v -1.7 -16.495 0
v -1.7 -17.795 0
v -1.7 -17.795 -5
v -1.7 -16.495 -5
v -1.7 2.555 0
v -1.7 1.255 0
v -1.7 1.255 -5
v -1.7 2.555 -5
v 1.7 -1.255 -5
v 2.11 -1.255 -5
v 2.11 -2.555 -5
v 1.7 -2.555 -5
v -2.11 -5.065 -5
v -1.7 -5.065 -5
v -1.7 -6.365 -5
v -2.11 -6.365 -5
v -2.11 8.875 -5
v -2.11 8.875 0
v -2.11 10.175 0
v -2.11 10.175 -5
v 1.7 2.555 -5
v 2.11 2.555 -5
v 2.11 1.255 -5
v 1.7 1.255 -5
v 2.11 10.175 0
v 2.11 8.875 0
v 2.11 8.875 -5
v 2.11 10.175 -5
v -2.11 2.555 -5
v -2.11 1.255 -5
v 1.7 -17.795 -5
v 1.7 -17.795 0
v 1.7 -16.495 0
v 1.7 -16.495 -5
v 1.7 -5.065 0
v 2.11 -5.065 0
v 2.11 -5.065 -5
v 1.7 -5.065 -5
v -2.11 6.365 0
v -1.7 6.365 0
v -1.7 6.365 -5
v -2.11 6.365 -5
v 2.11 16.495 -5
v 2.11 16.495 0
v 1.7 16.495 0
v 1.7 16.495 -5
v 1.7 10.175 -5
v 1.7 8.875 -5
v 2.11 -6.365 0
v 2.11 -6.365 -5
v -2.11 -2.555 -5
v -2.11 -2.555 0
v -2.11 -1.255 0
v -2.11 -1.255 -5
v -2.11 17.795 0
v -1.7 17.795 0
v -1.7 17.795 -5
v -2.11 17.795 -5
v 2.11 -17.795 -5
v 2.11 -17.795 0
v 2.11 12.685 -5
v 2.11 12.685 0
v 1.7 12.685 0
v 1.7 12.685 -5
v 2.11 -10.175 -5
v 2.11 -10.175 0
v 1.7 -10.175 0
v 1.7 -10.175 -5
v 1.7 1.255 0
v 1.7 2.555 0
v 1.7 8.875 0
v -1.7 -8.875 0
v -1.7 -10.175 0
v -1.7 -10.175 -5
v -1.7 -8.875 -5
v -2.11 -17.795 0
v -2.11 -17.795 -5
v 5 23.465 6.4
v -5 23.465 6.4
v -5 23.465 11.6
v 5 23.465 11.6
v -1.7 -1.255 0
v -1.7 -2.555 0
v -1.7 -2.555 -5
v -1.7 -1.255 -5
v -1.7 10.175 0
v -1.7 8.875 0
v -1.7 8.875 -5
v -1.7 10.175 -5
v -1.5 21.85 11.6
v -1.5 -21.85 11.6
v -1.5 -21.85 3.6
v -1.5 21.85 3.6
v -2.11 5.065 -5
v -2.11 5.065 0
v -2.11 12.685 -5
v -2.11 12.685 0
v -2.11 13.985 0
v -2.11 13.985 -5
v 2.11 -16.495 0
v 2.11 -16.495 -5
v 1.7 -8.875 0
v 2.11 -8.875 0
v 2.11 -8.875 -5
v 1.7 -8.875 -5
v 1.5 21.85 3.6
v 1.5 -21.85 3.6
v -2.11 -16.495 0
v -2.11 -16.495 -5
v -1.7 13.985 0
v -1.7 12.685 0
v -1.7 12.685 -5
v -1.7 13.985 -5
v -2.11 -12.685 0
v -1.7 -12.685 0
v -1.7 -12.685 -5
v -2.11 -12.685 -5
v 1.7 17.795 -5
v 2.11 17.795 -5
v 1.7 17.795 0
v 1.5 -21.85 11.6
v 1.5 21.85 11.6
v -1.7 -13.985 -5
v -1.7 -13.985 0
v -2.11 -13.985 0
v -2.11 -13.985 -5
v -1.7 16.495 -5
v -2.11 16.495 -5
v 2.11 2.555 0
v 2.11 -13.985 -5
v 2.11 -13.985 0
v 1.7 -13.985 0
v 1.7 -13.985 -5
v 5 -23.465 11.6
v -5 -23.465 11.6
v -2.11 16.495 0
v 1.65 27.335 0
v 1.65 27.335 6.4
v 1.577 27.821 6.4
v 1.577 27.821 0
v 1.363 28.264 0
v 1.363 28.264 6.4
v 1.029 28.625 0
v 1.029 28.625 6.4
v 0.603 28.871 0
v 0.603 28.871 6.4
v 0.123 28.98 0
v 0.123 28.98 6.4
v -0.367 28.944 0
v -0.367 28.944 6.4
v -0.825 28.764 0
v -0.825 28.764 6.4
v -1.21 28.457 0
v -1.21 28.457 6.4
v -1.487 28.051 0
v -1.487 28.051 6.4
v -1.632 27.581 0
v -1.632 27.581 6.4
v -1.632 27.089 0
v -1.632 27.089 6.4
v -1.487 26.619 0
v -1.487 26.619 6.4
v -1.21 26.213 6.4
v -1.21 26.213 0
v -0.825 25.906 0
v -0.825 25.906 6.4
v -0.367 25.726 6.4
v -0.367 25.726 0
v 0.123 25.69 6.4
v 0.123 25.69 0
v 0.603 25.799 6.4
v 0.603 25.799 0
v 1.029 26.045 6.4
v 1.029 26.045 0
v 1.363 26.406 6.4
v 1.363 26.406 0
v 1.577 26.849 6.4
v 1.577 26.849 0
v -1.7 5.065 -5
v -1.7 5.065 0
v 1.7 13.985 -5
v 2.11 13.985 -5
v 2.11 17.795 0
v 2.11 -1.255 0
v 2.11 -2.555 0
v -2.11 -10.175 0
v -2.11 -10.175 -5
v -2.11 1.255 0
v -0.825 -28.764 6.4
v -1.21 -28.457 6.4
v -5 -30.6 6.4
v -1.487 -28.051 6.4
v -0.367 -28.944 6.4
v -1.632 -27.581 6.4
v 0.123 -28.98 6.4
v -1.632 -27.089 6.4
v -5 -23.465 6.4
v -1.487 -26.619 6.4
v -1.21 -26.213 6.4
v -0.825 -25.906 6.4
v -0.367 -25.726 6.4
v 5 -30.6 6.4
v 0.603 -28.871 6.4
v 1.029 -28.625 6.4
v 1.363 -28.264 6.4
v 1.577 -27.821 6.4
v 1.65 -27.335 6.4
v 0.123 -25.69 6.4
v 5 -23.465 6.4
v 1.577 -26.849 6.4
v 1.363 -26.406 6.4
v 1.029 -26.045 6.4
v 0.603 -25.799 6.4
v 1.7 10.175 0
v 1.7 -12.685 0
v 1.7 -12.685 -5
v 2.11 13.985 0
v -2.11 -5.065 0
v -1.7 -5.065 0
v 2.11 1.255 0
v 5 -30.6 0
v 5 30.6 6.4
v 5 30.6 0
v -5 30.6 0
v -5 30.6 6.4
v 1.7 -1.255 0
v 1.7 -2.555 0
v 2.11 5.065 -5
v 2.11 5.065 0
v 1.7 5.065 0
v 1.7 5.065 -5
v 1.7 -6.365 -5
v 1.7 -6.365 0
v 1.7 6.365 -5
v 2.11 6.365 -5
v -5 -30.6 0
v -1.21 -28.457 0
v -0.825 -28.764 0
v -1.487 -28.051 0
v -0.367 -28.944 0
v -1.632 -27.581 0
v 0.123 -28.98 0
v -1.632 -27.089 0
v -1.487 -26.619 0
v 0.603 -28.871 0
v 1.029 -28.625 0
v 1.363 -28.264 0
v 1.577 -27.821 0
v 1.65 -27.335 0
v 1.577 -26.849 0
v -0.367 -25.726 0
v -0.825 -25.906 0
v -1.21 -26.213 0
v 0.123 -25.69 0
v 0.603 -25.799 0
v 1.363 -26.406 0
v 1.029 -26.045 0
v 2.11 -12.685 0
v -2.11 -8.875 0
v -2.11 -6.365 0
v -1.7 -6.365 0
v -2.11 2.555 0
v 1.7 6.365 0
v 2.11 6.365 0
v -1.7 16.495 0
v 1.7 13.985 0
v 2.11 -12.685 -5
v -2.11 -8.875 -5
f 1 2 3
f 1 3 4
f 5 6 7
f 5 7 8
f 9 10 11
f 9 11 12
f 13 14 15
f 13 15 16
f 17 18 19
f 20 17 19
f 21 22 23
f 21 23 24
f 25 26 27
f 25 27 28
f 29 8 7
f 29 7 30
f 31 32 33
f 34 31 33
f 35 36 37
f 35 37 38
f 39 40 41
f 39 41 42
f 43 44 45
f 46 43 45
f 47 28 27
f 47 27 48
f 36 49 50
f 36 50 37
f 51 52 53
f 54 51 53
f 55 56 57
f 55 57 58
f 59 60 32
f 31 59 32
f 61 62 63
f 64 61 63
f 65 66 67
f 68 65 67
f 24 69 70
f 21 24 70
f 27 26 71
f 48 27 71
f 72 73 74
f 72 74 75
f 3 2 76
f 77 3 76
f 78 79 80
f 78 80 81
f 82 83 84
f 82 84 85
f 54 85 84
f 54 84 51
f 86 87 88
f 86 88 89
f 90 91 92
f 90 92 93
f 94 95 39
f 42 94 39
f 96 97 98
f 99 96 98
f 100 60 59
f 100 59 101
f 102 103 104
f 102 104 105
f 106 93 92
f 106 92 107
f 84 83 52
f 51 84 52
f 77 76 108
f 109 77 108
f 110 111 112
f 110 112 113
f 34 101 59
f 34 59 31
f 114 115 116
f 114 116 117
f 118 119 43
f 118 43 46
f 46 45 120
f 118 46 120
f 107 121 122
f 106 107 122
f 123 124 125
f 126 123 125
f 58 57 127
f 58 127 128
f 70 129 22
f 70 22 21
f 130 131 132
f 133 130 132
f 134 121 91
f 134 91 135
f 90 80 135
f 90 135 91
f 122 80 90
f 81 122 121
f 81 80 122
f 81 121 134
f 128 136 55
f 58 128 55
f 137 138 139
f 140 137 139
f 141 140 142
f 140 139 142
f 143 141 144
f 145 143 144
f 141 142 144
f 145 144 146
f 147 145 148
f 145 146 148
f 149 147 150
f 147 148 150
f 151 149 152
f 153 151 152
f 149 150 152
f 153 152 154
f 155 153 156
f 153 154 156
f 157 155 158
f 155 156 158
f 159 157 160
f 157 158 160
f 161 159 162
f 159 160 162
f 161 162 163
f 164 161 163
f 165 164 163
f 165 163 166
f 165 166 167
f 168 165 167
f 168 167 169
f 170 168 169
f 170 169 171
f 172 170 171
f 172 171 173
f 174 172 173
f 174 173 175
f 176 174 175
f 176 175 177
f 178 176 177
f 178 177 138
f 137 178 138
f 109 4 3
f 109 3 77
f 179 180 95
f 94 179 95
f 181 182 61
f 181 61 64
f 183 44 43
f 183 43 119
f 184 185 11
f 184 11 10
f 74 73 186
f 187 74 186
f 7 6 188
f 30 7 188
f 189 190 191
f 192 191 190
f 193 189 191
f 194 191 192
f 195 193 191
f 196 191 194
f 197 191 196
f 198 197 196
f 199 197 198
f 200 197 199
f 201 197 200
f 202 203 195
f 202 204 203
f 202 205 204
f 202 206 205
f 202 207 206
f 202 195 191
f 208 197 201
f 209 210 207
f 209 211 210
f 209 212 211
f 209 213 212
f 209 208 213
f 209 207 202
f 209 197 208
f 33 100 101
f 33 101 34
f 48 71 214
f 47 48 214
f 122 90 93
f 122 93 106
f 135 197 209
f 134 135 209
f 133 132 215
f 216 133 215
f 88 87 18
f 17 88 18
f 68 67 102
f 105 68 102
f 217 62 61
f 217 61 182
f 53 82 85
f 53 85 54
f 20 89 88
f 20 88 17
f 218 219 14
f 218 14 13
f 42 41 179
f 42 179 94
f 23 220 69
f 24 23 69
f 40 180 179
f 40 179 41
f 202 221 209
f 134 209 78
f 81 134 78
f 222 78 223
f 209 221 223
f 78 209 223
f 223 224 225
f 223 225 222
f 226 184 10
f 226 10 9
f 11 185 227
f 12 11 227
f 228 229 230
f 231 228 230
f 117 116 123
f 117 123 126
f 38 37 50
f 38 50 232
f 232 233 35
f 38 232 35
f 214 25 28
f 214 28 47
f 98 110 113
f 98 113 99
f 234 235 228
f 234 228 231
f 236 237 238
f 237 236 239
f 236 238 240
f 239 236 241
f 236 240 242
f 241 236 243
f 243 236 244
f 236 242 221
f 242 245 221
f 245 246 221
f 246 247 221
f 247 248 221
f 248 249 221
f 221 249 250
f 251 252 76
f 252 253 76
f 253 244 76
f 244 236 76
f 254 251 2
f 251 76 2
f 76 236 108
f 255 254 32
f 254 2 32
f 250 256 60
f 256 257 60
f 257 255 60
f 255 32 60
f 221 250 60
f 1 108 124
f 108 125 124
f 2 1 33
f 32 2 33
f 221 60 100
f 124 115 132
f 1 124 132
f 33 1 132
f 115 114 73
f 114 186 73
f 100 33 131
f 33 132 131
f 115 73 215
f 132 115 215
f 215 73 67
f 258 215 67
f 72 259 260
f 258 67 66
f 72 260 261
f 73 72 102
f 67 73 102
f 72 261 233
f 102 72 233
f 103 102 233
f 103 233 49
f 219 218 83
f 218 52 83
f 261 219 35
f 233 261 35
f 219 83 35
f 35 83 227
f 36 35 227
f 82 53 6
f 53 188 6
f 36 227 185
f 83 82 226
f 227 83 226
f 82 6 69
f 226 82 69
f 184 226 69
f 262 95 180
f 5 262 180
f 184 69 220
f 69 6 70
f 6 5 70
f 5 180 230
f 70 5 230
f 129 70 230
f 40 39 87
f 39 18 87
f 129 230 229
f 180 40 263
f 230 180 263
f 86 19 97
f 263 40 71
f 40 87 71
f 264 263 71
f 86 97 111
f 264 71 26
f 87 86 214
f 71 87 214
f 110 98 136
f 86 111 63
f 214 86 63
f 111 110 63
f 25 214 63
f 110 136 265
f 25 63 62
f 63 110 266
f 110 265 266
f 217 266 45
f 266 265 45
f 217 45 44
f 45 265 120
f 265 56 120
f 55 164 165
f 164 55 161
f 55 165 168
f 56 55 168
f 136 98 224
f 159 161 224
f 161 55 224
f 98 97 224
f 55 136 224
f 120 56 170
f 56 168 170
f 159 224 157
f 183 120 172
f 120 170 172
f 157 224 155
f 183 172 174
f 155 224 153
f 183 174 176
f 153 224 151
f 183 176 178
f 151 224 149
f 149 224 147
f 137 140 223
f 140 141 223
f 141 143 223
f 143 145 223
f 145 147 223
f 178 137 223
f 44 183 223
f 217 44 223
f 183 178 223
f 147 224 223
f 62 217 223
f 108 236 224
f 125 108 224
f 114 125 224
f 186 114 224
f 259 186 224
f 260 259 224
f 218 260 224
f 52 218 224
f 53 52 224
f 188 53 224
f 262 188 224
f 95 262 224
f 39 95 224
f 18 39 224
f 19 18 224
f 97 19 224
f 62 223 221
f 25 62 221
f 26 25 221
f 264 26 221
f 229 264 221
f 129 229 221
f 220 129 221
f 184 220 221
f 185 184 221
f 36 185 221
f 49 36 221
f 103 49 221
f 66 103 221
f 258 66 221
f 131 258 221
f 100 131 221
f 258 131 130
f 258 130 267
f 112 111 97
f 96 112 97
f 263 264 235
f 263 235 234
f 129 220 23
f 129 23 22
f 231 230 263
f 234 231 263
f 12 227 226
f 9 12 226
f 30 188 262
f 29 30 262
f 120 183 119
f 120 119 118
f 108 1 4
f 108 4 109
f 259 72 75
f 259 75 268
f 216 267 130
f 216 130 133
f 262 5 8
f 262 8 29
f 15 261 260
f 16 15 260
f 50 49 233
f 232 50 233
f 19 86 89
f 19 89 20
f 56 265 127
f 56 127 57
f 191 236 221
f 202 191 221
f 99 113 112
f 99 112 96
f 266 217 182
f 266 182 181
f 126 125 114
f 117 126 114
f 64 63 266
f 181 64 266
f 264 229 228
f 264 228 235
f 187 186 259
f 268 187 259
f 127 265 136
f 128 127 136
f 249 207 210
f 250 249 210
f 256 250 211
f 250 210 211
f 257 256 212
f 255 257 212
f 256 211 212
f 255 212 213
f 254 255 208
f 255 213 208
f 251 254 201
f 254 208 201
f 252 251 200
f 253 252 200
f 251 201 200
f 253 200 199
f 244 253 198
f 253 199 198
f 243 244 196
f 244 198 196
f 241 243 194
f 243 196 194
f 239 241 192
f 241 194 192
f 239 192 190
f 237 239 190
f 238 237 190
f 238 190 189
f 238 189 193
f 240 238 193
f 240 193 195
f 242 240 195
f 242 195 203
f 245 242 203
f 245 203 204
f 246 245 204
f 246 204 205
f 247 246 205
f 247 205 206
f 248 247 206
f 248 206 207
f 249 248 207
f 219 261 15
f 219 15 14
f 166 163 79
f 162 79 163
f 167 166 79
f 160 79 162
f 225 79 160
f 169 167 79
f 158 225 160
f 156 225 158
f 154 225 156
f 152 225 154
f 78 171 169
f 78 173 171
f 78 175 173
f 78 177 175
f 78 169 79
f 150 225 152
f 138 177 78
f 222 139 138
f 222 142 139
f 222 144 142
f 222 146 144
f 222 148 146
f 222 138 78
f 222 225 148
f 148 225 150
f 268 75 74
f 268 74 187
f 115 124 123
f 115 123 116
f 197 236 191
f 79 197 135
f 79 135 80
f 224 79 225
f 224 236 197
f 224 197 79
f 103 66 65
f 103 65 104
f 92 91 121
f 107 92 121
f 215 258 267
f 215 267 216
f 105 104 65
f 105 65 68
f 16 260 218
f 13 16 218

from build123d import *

# Parameters (mm, degrees)
SKETCH_1_W          = 10
SKETCH_1_H          = 61.2
EXTRUDE_1_DEPTH     = 6.4
SKETCH_2_W          = 10
SKETCH_2_H          = 46.93
EXTRUDE_2_DEPTH     = 5.2
SKETCH_3_R          = 1.65
CUT_EXTRUDE_1_DEPTH = 15.3
SKETCH_4_W          = 0.41
SKETCH_4_H          = 1.3
EXTRUDE_3_DEPTH     = 5
SKETCH_5_W          = 3
SKETCH_5_H          = 43.7
CUT_EXTRUDE_2_DEPTH = 8


with BuildPart() as part:
    # 草图1 → 拉伸1 (new body)
    with BuildSketch(Plane.XY):
        Rectangle(SKETCH_1_W, SKETCH_1_H)
    extrude(amount=EXTRUDE_1_DEPTH)

    # 草图2 → 拉伸2 (add)
    with BuildSketch(Plane.XY.offset(6.4)):
        Rectangle(SKETCH_2_W, SKETCH_2_H)
    extrude(amount=EXTRUDE_2_DEPTH)

    # 草图3 → 切除-拉伸1 (cut)
    with BuildSketch(Plane.XY.offset(6.4)):
        with Locations((0, 27.335)):
            Circle(SKETCH_3_R)
        with Locations((0, -27.335)):
            Circle(SKETCH_3_R)
    extrude(amount=-CUT_EXTRUDE_1_DEPTH, mode=Mode.SUBTRACT)

    # 草图4 → 拉伸3 (add)
    with BuildSketch(Plane(origin=(0, 0, 0), x_dir=(-1, 0, 0), z_dir=(0, 0, -1))):
        with Locations((-1.905, 1.905)):
            Rectangle(SKETCH_4_W, SKETCH_4_H)
        with Locations((1.905, 1.905)):
            Rectangle(SKETCH_4_W, SKETCH_4_H)
        with Locations((-1.905, 5.715)):
            Rectangle(SKETCH_4_W, SKETCH_4_H)
        with Locations((1.905, 5.715)):
            Rectangle(SKETCH_4_W, SKETCH_4_H)
        with Locations((-1.905, 9.525)):
            Rectangle(SKETCH_4_W, SKETCH_4_H)
        with Locations((1.905, 9.525)):
            Rectangle(SKETCH_4_W, SKETCH_4_H)
        with Locations((-1.905, 13.335)):
            Rectangle(SKETCH_4_W, SKETCH_4_H)
        with Locations((1.905, 13.335)):
            Rectangle(SKETCH_4_W, SKETCH_4_H)
        with Locations((-1.905, 17.145)):
            Rectangle(SKETCH_4_W, SKETCH_4_H)
        with Locations((1.905, 17.145)):
            Rectangle(SKETCH_4_W, SKETCH_4_H)
        with Locations((-1.905, -1.905)):
            Rectangle(SKETCH_4_W, SKETCH_4_H)
        with Locations((1.905, -1.905)):
            Rectangle(SKETCH_4_W, SKETCH_4_H)
        with Locations((-1.905, -5.715)):
            Rectangle(SKETCH_4_W, SKETCH_4_H)
        with Locations((1.905, -5.715)):
            Rectangle(SKETCH_4_W, SKETCH_4_H)
        with Locations((-1.905, -9.525)):
            Rectangle(SKETCH_4_W, SKETCH_4_H)
        with Locations((1.905, -9.525)):
            Rectangle(SKETCH_4_W, SKETCH_4_H)
        with Locations((-1.905, -13.335)):
            Rectangle(SKETCH_4_W, SKETCH_4_H)
        with Locations((1.905, -13.335)):
            Rectangle(SKETCH_4_W, SKETCH_4_H)
        with Locations((-1.905, -17.145)):
            Rectangle(SKETCH_4_W, SKETCH_4_H)
        with Locations((1.905, -17.145)):
            Rectangle(SKETCH_4_W, SKETCH_4_H)
    extrude(amount=EXTRUDE_3_DEPTH)

    # 草图5 → 切除-拉伸2 (cut)
    with BuildSketch(Plane.XY.offset(11.6)):
        Rectangle(SKETCH_5_W, SKETCH_5_H)
    extrude(amount=-CUT_EXTRUDE_2_DEPTH, mode=Mode.SUBTRACT)


solid = part.part
